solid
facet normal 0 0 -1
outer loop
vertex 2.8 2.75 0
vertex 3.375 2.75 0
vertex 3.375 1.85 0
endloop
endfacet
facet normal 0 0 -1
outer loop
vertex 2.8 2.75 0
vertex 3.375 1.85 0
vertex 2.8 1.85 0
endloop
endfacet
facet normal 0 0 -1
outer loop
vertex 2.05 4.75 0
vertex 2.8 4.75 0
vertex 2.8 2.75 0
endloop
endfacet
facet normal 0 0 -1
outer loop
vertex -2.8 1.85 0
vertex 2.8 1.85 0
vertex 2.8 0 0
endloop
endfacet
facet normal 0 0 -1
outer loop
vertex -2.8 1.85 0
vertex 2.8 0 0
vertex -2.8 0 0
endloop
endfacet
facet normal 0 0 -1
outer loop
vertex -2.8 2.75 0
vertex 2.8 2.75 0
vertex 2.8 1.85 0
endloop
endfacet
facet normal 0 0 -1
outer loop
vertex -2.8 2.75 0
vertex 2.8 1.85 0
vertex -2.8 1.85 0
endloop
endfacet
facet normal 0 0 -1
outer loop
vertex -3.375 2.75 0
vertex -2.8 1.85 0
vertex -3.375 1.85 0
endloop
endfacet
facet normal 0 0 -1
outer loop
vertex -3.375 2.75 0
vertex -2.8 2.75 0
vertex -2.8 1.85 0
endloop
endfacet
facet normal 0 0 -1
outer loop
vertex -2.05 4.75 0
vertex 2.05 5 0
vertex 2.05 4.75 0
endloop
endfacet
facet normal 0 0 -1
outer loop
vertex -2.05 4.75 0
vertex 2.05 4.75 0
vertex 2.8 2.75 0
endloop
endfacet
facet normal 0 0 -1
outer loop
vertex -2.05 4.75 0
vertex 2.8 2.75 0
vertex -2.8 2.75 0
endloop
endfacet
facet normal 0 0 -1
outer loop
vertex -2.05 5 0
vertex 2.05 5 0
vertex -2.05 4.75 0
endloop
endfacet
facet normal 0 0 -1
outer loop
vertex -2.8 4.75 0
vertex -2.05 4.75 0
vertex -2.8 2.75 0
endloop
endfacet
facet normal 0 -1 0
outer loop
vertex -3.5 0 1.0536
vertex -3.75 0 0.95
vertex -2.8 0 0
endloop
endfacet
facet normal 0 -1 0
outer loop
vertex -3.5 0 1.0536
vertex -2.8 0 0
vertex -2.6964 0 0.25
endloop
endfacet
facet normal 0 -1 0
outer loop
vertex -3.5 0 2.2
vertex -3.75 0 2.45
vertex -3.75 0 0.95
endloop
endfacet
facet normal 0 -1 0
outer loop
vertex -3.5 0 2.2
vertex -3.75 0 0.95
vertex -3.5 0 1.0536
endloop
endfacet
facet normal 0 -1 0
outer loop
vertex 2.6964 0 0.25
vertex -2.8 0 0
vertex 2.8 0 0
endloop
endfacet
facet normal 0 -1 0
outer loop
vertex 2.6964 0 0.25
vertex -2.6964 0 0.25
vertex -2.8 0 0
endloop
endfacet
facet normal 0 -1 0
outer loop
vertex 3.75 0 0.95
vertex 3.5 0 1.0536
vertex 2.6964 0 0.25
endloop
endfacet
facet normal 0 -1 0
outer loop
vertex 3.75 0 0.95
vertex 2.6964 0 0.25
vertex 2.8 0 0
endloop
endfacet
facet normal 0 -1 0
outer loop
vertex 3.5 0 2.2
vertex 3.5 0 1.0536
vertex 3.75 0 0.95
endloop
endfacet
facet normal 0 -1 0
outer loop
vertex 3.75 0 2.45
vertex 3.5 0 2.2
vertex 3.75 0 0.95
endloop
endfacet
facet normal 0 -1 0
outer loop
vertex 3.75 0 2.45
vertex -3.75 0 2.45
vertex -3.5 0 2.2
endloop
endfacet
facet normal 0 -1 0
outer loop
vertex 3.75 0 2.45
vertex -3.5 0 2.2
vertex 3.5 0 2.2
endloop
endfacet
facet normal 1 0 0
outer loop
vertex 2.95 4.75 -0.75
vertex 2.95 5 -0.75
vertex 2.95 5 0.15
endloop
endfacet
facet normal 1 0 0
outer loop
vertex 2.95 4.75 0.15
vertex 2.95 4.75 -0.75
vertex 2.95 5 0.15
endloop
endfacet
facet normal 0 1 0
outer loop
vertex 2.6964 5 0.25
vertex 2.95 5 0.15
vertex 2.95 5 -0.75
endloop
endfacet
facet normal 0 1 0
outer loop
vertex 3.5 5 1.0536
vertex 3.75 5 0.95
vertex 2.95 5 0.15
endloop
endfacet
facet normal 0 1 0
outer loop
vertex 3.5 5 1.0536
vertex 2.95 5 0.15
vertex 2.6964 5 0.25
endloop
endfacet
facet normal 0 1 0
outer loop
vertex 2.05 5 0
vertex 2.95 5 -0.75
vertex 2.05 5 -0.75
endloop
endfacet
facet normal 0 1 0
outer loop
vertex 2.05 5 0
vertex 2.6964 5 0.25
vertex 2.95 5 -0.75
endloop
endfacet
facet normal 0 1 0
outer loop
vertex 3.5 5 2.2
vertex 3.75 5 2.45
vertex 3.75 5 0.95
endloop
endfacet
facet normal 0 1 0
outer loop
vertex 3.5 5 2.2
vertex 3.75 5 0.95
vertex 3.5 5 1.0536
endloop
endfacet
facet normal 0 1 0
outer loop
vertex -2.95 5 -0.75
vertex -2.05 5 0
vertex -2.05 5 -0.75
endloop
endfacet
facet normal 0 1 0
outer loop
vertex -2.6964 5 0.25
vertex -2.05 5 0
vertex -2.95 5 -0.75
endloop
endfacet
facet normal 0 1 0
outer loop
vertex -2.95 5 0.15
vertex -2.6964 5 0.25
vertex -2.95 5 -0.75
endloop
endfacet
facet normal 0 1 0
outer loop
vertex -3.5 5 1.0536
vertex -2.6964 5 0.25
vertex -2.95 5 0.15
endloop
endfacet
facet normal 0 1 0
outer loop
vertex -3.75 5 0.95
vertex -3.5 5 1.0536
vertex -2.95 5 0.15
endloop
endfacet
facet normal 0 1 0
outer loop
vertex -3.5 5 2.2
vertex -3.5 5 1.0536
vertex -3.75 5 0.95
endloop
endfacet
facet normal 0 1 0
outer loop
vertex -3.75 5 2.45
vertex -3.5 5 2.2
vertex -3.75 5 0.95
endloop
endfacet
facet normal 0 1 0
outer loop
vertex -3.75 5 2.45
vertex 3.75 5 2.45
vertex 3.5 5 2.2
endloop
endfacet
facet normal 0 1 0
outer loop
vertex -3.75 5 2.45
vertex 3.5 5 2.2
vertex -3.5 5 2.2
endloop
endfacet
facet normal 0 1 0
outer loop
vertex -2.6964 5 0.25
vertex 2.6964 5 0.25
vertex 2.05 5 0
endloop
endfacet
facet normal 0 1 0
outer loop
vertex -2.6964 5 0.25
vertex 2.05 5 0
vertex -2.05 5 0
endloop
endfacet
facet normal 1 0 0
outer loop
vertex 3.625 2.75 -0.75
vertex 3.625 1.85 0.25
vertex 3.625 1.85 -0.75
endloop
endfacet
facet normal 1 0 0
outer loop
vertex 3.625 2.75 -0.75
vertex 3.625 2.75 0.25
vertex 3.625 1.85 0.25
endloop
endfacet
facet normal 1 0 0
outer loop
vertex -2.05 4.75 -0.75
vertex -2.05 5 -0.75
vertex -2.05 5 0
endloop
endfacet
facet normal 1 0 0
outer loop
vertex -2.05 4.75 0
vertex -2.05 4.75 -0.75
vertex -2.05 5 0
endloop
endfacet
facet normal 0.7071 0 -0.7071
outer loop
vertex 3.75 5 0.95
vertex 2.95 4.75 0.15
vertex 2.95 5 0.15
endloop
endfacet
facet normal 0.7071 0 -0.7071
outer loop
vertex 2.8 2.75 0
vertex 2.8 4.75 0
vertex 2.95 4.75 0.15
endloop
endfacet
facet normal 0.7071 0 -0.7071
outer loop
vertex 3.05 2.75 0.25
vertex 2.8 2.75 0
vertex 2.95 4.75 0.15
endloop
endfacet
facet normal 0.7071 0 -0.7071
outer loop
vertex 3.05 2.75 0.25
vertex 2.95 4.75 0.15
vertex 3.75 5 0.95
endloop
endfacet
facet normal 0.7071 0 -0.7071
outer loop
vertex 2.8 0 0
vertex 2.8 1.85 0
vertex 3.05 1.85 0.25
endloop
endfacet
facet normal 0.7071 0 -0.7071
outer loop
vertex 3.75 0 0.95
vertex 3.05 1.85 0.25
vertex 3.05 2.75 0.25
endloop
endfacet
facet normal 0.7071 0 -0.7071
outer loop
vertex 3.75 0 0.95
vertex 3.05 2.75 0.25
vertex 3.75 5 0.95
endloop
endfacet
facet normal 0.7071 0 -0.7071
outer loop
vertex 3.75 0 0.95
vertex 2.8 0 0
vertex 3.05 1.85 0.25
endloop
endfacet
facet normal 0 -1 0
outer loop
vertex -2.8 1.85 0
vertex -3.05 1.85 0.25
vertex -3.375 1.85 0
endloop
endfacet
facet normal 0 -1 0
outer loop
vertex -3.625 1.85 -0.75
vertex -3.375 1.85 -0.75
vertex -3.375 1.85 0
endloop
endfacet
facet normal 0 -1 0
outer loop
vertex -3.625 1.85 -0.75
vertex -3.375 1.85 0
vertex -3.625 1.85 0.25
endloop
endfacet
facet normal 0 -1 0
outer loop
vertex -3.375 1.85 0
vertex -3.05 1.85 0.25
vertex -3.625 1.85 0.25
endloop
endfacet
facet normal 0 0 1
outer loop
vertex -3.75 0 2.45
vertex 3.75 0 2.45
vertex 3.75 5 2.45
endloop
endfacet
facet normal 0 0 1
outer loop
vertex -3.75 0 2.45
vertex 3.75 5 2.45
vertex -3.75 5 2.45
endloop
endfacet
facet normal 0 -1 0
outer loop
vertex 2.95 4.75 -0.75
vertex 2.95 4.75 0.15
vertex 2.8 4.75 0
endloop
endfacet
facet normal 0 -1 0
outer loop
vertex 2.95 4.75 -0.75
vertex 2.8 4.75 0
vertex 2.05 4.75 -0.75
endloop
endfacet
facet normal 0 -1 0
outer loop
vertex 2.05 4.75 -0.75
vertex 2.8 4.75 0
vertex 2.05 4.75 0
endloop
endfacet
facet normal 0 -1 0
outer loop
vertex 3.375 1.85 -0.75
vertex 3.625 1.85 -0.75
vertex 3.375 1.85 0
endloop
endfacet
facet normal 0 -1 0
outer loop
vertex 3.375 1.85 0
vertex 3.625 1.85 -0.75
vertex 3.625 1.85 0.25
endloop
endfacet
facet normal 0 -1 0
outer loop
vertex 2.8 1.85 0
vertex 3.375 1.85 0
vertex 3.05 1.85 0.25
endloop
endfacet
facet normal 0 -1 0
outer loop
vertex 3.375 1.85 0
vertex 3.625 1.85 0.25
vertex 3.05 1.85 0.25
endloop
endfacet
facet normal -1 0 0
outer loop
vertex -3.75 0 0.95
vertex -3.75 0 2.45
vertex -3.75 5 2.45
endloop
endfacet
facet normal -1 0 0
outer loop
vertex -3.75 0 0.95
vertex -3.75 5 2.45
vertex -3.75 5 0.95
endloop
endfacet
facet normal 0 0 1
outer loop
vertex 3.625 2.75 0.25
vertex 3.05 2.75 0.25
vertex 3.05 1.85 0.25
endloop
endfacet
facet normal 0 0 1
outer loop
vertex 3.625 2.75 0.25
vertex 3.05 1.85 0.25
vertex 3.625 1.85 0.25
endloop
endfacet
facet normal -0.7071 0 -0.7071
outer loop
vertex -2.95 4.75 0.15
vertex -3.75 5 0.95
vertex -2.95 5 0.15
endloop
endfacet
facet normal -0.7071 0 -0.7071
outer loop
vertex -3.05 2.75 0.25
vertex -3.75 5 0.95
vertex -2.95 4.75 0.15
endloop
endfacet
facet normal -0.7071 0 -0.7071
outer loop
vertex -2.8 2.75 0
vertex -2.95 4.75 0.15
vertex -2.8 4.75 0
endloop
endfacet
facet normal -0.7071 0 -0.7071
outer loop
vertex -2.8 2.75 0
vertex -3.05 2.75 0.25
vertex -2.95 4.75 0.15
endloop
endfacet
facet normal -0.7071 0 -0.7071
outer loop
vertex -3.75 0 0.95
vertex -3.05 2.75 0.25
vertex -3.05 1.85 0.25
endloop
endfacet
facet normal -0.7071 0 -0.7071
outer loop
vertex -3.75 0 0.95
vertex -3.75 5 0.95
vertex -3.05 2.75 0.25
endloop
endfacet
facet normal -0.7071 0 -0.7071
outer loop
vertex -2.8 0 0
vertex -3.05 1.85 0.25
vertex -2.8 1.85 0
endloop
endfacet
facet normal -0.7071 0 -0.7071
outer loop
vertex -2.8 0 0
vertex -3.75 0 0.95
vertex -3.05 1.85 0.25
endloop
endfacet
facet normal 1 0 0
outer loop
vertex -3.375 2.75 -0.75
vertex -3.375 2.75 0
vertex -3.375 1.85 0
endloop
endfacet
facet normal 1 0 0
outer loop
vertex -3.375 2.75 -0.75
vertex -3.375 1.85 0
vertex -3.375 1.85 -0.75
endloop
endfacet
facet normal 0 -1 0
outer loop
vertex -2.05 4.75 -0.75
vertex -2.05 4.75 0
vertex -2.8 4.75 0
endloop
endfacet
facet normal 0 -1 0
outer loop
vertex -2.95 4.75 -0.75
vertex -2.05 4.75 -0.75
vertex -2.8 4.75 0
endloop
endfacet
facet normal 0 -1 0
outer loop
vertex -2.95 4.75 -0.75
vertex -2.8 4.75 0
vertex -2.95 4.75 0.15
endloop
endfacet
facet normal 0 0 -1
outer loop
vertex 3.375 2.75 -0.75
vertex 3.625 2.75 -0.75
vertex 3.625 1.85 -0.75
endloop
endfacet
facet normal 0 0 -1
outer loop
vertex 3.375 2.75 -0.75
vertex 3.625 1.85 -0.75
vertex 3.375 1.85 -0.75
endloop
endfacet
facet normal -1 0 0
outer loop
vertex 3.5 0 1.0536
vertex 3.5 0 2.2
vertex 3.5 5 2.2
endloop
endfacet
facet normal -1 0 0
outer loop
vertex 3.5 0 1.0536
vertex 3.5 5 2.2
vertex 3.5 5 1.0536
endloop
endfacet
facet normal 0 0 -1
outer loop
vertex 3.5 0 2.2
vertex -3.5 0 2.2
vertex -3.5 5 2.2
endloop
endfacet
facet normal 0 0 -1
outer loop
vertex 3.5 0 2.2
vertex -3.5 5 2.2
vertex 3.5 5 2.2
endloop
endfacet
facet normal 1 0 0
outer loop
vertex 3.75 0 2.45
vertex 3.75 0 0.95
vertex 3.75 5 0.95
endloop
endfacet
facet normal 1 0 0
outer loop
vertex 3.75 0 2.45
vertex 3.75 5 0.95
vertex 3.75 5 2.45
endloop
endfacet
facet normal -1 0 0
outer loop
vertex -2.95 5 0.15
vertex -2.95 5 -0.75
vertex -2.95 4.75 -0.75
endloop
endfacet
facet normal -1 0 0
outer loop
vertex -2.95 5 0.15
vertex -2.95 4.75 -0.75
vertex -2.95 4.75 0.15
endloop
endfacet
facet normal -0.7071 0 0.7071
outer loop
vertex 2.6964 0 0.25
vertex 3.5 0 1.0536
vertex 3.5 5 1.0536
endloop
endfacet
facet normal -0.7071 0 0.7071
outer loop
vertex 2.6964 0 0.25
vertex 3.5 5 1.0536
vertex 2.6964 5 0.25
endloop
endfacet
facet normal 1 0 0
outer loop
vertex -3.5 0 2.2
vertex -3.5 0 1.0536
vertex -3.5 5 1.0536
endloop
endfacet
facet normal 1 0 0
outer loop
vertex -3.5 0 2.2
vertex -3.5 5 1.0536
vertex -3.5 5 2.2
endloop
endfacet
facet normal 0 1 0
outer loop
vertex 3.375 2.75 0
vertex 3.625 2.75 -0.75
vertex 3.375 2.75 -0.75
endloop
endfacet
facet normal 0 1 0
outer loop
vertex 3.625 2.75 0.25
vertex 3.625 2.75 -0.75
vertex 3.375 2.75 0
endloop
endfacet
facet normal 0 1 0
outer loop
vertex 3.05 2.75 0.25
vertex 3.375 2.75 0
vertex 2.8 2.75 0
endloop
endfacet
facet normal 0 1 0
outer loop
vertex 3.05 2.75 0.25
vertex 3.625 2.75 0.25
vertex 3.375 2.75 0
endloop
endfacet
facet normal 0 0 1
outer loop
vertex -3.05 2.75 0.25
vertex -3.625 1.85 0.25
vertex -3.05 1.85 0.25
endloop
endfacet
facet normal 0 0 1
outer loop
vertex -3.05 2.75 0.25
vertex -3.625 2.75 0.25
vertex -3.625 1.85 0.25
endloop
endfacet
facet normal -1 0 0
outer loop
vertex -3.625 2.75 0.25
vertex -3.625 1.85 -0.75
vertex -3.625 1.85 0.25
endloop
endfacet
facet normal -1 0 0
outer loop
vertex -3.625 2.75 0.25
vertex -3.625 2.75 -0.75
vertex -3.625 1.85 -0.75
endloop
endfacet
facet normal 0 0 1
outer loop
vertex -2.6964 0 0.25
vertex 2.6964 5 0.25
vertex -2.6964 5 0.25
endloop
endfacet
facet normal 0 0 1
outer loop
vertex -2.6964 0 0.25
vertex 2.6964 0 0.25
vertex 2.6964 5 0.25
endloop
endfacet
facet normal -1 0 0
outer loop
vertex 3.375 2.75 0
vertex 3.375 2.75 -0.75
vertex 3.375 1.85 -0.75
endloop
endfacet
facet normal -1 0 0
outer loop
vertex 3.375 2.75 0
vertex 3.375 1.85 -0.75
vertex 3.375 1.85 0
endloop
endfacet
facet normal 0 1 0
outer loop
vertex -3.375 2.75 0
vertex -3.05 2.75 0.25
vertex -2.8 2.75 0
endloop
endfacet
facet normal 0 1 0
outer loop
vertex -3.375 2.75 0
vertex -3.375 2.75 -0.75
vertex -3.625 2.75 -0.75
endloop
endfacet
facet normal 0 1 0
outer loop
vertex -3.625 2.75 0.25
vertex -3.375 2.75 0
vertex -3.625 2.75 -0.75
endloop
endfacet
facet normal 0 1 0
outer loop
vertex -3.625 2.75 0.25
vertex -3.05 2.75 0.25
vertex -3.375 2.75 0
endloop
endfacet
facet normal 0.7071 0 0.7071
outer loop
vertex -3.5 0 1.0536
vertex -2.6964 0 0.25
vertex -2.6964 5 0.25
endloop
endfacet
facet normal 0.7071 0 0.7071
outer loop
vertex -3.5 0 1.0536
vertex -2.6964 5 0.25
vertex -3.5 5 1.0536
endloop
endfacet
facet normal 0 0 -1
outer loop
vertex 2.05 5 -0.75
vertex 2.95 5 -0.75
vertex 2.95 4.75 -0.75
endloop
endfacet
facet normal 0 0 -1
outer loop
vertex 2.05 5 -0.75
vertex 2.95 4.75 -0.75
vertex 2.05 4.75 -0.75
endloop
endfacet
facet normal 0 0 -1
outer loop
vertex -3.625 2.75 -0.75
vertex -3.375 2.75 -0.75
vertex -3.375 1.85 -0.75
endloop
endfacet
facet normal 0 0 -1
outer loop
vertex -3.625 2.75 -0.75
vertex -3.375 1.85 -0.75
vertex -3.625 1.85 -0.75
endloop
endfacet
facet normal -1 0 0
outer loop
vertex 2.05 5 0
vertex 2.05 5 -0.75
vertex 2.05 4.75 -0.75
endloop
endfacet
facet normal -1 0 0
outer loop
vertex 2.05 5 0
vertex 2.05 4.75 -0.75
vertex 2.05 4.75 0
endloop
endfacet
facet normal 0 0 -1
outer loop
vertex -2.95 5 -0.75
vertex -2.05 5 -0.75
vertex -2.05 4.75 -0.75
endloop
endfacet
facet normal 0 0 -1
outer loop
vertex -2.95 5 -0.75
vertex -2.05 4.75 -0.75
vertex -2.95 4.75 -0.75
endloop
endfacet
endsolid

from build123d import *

# Parameters (mm, degrees)
F1_DEPTH = 5
F4_DEPTH = 0.45
F5_W     = 0.9
F5_H     = 1
F6_DEPTH = 0.25


with BuildPart() as f1:
    # F0 (on Front) → F1 (new body)
    with BuildSketch(Plane.XZ):
        Polygon((-2.8, 0), (0, 0), (2.8, 0), (3.75, 0.95), (3.75, 2.45), (0, 2.45), (-3.75, 2.45), (-3.75, 0.95), align=None)
        Polygon((0, 2.1999999881), (3.4999999881, 2.1999999881), (3.4999999881, 1.0535533955), (2.6964466045, 0.2500000119), (0, 0.2500000119), (-2.6964466045, 0.2500000119), (-3.4999999881, 1.0535533955), (-3.4999999881, 2.1999999881), align=None, mode=Mode.SUBTRACT)
    extrude(amount=-F1_DEPTH)

    # F3 (on offset) → F4 (join, symmetric)
    with BuildSketch(Plane(origin=(0, 2.3, 0), x_dir=(-1, 0, 0), z_dir=(0, 1, 0))):
        Polygon((-3.625, 0.2500000119), (-3.625, -0.7499999881), (-3.375, -0.7499999881), (-3.375, 0), (3.375, 0), (3.375, -0.7499999881), (3.625, -0.7499999881), (3.625, 0.2500000119), align=None)
    extrude(amount=F4_DEPTH, both=True)

    # F5 (on face) → F6 (join)
    with BuildSketch(Plane(origin=(0, 5, 0), x_dir=(-1, 0, 0), z_dir=(0, 1, 0))):
        with Locations((-2.5, -0.2499999881)):
            Rectangle(F5_W, F5_H)
        with Locations((2.5, -0.2499999881)):
            Rectangle(F5_W, F5_H)
    extrude(amount=-F6_DEPTH)


solid = f1.part
